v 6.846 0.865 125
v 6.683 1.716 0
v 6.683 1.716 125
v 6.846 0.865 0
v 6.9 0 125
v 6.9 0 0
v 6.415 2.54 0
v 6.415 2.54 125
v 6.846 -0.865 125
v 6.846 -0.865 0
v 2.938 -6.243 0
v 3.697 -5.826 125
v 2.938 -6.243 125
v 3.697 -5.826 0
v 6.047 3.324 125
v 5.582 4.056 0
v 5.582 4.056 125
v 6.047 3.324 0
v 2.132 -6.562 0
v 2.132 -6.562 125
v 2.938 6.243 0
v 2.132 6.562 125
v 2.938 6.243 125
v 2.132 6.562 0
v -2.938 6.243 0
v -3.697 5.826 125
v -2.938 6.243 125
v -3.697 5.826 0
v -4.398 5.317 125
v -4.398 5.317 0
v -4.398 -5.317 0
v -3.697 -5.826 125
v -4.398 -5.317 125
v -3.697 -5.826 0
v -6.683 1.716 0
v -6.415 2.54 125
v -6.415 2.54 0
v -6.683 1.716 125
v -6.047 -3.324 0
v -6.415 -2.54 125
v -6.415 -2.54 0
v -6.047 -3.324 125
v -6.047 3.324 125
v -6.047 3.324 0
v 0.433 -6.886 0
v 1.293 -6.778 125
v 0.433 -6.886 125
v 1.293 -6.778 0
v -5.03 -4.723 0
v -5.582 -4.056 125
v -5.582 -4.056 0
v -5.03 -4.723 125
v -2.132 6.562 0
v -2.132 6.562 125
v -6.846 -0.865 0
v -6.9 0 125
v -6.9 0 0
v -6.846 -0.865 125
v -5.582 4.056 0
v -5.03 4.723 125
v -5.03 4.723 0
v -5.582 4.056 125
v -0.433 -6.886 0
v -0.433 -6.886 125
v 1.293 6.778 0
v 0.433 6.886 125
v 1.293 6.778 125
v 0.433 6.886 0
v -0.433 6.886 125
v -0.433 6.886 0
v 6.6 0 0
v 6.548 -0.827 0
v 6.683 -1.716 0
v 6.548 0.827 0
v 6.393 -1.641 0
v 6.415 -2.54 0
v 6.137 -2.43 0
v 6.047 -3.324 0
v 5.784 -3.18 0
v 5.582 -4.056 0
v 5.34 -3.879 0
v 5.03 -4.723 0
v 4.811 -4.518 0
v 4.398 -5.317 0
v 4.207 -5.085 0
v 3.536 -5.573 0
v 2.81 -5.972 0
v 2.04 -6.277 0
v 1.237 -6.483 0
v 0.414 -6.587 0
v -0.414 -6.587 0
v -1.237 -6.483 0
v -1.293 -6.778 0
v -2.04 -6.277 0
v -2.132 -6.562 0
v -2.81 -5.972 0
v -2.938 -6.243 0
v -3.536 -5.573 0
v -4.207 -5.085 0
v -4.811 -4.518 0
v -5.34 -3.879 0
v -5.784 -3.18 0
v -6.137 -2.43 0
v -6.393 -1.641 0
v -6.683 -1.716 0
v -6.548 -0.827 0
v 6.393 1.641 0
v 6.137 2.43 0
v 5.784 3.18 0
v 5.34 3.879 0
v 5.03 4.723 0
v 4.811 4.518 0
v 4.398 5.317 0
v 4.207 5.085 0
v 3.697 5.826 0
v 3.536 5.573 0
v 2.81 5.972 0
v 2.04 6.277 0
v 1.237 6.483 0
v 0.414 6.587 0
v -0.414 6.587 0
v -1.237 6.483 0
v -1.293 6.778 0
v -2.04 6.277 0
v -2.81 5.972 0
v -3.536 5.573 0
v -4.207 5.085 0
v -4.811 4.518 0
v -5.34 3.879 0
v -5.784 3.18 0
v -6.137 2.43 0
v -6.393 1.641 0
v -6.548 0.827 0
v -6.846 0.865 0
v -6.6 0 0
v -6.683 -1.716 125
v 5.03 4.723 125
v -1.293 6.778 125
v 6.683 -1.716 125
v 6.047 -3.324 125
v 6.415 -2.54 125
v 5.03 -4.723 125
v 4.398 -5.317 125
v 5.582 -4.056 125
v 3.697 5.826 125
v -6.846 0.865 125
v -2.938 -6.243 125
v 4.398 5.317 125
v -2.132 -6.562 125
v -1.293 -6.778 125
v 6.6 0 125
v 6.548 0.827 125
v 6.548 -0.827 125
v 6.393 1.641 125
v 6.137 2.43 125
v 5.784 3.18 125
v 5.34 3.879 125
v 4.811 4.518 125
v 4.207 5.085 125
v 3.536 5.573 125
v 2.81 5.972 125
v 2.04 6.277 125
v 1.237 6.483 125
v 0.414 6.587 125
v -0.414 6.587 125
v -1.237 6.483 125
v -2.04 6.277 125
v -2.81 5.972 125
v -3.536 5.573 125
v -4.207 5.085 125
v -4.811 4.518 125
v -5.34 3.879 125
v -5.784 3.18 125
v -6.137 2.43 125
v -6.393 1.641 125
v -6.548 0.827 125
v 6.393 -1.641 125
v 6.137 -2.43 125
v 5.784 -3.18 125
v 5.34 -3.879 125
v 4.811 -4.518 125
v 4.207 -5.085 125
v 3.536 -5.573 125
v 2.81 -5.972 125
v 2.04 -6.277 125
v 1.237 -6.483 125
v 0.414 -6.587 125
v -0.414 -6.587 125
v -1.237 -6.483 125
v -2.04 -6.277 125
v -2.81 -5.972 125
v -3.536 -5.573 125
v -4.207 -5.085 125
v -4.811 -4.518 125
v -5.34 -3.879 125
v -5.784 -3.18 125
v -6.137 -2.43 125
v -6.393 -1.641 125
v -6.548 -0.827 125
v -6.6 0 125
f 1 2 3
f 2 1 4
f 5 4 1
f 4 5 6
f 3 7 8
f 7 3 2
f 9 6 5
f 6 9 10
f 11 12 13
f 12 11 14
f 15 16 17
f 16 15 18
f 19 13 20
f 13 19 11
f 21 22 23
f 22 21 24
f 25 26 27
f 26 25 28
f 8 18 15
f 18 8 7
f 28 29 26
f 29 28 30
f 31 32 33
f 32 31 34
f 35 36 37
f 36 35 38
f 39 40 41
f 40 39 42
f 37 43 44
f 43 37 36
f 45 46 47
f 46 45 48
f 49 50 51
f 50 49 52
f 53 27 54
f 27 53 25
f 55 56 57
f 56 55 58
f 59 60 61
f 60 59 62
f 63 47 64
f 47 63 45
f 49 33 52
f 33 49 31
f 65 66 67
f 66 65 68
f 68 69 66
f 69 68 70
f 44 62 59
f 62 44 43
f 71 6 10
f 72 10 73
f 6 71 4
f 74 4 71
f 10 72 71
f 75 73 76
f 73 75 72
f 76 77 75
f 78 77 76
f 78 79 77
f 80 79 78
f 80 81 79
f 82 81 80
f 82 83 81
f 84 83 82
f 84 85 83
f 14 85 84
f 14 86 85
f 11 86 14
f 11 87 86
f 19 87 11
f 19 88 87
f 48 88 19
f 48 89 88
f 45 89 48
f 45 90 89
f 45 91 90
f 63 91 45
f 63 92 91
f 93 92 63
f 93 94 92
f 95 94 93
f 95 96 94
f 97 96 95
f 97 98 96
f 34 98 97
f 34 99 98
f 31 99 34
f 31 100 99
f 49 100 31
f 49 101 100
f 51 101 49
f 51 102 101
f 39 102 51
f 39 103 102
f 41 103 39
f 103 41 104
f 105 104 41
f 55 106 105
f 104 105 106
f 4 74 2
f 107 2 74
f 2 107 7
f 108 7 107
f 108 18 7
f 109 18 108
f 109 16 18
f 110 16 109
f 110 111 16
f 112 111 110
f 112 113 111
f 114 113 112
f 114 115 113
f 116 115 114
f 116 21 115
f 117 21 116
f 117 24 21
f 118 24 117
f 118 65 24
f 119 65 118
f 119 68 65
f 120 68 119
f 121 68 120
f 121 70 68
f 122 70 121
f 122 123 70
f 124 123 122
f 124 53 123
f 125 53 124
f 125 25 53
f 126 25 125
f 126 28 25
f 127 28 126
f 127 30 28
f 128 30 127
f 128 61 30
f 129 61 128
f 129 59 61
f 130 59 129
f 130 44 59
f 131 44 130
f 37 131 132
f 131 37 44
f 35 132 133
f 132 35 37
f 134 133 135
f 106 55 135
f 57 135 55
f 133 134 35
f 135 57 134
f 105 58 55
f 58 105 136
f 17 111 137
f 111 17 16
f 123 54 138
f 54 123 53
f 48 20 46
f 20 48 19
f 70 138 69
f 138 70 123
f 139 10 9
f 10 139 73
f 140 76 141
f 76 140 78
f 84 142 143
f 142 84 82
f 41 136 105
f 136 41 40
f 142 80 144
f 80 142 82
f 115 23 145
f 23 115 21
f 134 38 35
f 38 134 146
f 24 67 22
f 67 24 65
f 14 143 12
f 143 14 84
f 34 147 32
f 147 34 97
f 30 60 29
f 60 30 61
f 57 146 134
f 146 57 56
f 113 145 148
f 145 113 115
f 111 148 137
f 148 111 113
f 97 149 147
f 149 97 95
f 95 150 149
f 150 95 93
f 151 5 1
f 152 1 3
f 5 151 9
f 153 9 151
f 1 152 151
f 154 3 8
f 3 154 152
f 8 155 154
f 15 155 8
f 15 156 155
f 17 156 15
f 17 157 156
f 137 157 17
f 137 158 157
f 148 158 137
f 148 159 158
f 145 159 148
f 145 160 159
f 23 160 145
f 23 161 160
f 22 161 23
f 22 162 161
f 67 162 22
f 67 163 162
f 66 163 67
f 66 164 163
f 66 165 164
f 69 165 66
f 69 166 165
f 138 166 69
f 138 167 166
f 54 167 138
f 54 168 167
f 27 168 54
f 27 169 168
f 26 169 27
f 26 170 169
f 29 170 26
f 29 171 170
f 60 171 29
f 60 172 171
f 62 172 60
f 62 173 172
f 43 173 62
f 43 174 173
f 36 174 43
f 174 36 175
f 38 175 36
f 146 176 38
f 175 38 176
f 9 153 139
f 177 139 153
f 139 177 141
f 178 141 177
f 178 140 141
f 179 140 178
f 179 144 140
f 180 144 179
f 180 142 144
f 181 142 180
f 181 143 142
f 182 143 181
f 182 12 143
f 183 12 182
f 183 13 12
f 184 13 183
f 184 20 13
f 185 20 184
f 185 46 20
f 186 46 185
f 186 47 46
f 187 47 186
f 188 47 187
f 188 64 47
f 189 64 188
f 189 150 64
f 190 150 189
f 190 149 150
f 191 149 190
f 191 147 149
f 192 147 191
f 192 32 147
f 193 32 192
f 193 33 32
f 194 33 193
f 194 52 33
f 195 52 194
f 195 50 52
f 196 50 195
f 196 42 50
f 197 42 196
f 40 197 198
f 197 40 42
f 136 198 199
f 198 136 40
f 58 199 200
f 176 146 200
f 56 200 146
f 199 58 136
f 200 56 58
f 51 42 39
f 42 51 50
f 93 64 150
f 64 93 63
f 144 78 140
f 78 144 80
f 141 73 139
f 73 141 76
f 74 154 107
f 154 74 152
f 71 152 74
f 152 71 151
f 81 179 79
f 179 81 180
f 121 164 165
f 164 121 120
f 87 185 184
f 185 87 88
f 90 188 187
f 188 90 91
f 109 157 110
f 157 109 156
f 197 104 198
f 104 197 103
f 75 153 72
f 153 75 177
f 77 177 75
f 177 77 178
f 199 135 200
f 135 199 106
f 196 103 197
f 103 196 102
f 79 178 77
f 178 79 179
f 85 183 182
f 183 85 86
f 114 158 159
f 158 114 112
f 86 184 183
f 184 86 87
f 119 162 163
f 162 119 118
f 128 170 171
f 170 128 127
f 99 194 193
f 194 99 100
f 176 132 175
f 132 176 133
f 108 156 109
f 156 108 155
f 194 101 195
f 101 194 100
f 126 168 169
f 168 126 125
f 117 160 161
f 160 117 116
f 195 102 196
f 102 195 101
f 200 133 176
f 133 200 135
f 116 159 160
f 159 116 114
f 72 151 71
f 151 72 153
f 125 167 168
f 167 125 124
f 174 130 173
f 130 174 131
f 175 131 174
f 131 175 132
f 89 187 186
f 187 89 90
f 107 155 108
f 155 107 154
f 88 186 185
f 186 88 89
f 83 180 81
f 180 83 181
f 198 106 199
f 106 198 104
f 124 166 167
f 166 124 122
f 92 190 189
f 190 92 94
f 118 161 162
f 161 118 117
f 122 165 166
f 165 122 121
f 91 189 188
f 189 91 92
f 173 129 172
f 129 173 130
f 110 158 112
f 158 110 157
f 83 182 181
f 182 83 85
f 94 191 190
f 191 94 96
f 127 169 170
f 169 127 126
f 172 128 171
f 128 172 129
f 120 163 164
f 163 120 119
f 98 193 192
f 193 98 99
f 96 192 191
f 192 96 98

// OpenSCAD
tube_size = 13.8; //[13.8:BT-5, 18.7:BT-20, 24.8:BT-50, 33.7:BT-55, 34.2:BT-56, 41.6:BT-60, 56.3:BT-70, 66.04:BT-80, 100:BT-101]

//How long do you want the tube to be (mm)?
length = 125;

if (tube_size==13.8) {
difference(){
cylinder(h=length, r=13.8/2, center=false, $fn=50);
    cylinder (h=length, r=13.2/2, center=false, $fn=50);
}
}

if (tube_size==18.7) {
difference(){
cylinder(h=length, r=18.7/2, center=false, $fn=50);
    cylinder (h=length, r=18/2, center=false, $fn=50);
}
}

if (tube_size==24.8) {
difference(){
cylinder(h=length, r=24.8/2, center=false, $fn=50);
    cylinder (h=length, r=24.1/2, center=false, $fn=50);
}
}

if (tube_size==33.7) {
difference(){
cylinder(h=length, r=33.7/2, center=false, $fn=50);
    cylinder (h=length, r=32.6/2, center=false, $fn=50);
}
}

if (tube_size==34.2) {
difference(){
cylinder(h=length, r=34.2/2, center=false, $fn=50);
    cylinder (h=length, r=33.1/2, center=false, $fn=50);
}
}

if (tube_size==41.6) {
difference(){
cylinder(h=length, r=41.6/2, center=false, $fn=50);
    cylinder (h=length, r=40.5/2, center=false, $fn=50);
}
}

if (tube_size==56.3) {
difference(){
cylinder(h=length, r=56.3/2, center=false, $fn=50);
    cylinder (h=length, r=55.4/2, center=false, $fn=50);
}
}

if (tube_size==66.04) {
difference(){
cylinder(h=length, r=66.04/2, center=false, $fn=50);
    cylinder (h=length, r=65.7/2, center=false, $fn=50);
}
}

if (tube_size==100) {
difference(){
cylinder(h=length, r=100/2, center=false, $fn=50);
    cylinder (h=length, r=99/2, center=false, $fn=50);
}
}
